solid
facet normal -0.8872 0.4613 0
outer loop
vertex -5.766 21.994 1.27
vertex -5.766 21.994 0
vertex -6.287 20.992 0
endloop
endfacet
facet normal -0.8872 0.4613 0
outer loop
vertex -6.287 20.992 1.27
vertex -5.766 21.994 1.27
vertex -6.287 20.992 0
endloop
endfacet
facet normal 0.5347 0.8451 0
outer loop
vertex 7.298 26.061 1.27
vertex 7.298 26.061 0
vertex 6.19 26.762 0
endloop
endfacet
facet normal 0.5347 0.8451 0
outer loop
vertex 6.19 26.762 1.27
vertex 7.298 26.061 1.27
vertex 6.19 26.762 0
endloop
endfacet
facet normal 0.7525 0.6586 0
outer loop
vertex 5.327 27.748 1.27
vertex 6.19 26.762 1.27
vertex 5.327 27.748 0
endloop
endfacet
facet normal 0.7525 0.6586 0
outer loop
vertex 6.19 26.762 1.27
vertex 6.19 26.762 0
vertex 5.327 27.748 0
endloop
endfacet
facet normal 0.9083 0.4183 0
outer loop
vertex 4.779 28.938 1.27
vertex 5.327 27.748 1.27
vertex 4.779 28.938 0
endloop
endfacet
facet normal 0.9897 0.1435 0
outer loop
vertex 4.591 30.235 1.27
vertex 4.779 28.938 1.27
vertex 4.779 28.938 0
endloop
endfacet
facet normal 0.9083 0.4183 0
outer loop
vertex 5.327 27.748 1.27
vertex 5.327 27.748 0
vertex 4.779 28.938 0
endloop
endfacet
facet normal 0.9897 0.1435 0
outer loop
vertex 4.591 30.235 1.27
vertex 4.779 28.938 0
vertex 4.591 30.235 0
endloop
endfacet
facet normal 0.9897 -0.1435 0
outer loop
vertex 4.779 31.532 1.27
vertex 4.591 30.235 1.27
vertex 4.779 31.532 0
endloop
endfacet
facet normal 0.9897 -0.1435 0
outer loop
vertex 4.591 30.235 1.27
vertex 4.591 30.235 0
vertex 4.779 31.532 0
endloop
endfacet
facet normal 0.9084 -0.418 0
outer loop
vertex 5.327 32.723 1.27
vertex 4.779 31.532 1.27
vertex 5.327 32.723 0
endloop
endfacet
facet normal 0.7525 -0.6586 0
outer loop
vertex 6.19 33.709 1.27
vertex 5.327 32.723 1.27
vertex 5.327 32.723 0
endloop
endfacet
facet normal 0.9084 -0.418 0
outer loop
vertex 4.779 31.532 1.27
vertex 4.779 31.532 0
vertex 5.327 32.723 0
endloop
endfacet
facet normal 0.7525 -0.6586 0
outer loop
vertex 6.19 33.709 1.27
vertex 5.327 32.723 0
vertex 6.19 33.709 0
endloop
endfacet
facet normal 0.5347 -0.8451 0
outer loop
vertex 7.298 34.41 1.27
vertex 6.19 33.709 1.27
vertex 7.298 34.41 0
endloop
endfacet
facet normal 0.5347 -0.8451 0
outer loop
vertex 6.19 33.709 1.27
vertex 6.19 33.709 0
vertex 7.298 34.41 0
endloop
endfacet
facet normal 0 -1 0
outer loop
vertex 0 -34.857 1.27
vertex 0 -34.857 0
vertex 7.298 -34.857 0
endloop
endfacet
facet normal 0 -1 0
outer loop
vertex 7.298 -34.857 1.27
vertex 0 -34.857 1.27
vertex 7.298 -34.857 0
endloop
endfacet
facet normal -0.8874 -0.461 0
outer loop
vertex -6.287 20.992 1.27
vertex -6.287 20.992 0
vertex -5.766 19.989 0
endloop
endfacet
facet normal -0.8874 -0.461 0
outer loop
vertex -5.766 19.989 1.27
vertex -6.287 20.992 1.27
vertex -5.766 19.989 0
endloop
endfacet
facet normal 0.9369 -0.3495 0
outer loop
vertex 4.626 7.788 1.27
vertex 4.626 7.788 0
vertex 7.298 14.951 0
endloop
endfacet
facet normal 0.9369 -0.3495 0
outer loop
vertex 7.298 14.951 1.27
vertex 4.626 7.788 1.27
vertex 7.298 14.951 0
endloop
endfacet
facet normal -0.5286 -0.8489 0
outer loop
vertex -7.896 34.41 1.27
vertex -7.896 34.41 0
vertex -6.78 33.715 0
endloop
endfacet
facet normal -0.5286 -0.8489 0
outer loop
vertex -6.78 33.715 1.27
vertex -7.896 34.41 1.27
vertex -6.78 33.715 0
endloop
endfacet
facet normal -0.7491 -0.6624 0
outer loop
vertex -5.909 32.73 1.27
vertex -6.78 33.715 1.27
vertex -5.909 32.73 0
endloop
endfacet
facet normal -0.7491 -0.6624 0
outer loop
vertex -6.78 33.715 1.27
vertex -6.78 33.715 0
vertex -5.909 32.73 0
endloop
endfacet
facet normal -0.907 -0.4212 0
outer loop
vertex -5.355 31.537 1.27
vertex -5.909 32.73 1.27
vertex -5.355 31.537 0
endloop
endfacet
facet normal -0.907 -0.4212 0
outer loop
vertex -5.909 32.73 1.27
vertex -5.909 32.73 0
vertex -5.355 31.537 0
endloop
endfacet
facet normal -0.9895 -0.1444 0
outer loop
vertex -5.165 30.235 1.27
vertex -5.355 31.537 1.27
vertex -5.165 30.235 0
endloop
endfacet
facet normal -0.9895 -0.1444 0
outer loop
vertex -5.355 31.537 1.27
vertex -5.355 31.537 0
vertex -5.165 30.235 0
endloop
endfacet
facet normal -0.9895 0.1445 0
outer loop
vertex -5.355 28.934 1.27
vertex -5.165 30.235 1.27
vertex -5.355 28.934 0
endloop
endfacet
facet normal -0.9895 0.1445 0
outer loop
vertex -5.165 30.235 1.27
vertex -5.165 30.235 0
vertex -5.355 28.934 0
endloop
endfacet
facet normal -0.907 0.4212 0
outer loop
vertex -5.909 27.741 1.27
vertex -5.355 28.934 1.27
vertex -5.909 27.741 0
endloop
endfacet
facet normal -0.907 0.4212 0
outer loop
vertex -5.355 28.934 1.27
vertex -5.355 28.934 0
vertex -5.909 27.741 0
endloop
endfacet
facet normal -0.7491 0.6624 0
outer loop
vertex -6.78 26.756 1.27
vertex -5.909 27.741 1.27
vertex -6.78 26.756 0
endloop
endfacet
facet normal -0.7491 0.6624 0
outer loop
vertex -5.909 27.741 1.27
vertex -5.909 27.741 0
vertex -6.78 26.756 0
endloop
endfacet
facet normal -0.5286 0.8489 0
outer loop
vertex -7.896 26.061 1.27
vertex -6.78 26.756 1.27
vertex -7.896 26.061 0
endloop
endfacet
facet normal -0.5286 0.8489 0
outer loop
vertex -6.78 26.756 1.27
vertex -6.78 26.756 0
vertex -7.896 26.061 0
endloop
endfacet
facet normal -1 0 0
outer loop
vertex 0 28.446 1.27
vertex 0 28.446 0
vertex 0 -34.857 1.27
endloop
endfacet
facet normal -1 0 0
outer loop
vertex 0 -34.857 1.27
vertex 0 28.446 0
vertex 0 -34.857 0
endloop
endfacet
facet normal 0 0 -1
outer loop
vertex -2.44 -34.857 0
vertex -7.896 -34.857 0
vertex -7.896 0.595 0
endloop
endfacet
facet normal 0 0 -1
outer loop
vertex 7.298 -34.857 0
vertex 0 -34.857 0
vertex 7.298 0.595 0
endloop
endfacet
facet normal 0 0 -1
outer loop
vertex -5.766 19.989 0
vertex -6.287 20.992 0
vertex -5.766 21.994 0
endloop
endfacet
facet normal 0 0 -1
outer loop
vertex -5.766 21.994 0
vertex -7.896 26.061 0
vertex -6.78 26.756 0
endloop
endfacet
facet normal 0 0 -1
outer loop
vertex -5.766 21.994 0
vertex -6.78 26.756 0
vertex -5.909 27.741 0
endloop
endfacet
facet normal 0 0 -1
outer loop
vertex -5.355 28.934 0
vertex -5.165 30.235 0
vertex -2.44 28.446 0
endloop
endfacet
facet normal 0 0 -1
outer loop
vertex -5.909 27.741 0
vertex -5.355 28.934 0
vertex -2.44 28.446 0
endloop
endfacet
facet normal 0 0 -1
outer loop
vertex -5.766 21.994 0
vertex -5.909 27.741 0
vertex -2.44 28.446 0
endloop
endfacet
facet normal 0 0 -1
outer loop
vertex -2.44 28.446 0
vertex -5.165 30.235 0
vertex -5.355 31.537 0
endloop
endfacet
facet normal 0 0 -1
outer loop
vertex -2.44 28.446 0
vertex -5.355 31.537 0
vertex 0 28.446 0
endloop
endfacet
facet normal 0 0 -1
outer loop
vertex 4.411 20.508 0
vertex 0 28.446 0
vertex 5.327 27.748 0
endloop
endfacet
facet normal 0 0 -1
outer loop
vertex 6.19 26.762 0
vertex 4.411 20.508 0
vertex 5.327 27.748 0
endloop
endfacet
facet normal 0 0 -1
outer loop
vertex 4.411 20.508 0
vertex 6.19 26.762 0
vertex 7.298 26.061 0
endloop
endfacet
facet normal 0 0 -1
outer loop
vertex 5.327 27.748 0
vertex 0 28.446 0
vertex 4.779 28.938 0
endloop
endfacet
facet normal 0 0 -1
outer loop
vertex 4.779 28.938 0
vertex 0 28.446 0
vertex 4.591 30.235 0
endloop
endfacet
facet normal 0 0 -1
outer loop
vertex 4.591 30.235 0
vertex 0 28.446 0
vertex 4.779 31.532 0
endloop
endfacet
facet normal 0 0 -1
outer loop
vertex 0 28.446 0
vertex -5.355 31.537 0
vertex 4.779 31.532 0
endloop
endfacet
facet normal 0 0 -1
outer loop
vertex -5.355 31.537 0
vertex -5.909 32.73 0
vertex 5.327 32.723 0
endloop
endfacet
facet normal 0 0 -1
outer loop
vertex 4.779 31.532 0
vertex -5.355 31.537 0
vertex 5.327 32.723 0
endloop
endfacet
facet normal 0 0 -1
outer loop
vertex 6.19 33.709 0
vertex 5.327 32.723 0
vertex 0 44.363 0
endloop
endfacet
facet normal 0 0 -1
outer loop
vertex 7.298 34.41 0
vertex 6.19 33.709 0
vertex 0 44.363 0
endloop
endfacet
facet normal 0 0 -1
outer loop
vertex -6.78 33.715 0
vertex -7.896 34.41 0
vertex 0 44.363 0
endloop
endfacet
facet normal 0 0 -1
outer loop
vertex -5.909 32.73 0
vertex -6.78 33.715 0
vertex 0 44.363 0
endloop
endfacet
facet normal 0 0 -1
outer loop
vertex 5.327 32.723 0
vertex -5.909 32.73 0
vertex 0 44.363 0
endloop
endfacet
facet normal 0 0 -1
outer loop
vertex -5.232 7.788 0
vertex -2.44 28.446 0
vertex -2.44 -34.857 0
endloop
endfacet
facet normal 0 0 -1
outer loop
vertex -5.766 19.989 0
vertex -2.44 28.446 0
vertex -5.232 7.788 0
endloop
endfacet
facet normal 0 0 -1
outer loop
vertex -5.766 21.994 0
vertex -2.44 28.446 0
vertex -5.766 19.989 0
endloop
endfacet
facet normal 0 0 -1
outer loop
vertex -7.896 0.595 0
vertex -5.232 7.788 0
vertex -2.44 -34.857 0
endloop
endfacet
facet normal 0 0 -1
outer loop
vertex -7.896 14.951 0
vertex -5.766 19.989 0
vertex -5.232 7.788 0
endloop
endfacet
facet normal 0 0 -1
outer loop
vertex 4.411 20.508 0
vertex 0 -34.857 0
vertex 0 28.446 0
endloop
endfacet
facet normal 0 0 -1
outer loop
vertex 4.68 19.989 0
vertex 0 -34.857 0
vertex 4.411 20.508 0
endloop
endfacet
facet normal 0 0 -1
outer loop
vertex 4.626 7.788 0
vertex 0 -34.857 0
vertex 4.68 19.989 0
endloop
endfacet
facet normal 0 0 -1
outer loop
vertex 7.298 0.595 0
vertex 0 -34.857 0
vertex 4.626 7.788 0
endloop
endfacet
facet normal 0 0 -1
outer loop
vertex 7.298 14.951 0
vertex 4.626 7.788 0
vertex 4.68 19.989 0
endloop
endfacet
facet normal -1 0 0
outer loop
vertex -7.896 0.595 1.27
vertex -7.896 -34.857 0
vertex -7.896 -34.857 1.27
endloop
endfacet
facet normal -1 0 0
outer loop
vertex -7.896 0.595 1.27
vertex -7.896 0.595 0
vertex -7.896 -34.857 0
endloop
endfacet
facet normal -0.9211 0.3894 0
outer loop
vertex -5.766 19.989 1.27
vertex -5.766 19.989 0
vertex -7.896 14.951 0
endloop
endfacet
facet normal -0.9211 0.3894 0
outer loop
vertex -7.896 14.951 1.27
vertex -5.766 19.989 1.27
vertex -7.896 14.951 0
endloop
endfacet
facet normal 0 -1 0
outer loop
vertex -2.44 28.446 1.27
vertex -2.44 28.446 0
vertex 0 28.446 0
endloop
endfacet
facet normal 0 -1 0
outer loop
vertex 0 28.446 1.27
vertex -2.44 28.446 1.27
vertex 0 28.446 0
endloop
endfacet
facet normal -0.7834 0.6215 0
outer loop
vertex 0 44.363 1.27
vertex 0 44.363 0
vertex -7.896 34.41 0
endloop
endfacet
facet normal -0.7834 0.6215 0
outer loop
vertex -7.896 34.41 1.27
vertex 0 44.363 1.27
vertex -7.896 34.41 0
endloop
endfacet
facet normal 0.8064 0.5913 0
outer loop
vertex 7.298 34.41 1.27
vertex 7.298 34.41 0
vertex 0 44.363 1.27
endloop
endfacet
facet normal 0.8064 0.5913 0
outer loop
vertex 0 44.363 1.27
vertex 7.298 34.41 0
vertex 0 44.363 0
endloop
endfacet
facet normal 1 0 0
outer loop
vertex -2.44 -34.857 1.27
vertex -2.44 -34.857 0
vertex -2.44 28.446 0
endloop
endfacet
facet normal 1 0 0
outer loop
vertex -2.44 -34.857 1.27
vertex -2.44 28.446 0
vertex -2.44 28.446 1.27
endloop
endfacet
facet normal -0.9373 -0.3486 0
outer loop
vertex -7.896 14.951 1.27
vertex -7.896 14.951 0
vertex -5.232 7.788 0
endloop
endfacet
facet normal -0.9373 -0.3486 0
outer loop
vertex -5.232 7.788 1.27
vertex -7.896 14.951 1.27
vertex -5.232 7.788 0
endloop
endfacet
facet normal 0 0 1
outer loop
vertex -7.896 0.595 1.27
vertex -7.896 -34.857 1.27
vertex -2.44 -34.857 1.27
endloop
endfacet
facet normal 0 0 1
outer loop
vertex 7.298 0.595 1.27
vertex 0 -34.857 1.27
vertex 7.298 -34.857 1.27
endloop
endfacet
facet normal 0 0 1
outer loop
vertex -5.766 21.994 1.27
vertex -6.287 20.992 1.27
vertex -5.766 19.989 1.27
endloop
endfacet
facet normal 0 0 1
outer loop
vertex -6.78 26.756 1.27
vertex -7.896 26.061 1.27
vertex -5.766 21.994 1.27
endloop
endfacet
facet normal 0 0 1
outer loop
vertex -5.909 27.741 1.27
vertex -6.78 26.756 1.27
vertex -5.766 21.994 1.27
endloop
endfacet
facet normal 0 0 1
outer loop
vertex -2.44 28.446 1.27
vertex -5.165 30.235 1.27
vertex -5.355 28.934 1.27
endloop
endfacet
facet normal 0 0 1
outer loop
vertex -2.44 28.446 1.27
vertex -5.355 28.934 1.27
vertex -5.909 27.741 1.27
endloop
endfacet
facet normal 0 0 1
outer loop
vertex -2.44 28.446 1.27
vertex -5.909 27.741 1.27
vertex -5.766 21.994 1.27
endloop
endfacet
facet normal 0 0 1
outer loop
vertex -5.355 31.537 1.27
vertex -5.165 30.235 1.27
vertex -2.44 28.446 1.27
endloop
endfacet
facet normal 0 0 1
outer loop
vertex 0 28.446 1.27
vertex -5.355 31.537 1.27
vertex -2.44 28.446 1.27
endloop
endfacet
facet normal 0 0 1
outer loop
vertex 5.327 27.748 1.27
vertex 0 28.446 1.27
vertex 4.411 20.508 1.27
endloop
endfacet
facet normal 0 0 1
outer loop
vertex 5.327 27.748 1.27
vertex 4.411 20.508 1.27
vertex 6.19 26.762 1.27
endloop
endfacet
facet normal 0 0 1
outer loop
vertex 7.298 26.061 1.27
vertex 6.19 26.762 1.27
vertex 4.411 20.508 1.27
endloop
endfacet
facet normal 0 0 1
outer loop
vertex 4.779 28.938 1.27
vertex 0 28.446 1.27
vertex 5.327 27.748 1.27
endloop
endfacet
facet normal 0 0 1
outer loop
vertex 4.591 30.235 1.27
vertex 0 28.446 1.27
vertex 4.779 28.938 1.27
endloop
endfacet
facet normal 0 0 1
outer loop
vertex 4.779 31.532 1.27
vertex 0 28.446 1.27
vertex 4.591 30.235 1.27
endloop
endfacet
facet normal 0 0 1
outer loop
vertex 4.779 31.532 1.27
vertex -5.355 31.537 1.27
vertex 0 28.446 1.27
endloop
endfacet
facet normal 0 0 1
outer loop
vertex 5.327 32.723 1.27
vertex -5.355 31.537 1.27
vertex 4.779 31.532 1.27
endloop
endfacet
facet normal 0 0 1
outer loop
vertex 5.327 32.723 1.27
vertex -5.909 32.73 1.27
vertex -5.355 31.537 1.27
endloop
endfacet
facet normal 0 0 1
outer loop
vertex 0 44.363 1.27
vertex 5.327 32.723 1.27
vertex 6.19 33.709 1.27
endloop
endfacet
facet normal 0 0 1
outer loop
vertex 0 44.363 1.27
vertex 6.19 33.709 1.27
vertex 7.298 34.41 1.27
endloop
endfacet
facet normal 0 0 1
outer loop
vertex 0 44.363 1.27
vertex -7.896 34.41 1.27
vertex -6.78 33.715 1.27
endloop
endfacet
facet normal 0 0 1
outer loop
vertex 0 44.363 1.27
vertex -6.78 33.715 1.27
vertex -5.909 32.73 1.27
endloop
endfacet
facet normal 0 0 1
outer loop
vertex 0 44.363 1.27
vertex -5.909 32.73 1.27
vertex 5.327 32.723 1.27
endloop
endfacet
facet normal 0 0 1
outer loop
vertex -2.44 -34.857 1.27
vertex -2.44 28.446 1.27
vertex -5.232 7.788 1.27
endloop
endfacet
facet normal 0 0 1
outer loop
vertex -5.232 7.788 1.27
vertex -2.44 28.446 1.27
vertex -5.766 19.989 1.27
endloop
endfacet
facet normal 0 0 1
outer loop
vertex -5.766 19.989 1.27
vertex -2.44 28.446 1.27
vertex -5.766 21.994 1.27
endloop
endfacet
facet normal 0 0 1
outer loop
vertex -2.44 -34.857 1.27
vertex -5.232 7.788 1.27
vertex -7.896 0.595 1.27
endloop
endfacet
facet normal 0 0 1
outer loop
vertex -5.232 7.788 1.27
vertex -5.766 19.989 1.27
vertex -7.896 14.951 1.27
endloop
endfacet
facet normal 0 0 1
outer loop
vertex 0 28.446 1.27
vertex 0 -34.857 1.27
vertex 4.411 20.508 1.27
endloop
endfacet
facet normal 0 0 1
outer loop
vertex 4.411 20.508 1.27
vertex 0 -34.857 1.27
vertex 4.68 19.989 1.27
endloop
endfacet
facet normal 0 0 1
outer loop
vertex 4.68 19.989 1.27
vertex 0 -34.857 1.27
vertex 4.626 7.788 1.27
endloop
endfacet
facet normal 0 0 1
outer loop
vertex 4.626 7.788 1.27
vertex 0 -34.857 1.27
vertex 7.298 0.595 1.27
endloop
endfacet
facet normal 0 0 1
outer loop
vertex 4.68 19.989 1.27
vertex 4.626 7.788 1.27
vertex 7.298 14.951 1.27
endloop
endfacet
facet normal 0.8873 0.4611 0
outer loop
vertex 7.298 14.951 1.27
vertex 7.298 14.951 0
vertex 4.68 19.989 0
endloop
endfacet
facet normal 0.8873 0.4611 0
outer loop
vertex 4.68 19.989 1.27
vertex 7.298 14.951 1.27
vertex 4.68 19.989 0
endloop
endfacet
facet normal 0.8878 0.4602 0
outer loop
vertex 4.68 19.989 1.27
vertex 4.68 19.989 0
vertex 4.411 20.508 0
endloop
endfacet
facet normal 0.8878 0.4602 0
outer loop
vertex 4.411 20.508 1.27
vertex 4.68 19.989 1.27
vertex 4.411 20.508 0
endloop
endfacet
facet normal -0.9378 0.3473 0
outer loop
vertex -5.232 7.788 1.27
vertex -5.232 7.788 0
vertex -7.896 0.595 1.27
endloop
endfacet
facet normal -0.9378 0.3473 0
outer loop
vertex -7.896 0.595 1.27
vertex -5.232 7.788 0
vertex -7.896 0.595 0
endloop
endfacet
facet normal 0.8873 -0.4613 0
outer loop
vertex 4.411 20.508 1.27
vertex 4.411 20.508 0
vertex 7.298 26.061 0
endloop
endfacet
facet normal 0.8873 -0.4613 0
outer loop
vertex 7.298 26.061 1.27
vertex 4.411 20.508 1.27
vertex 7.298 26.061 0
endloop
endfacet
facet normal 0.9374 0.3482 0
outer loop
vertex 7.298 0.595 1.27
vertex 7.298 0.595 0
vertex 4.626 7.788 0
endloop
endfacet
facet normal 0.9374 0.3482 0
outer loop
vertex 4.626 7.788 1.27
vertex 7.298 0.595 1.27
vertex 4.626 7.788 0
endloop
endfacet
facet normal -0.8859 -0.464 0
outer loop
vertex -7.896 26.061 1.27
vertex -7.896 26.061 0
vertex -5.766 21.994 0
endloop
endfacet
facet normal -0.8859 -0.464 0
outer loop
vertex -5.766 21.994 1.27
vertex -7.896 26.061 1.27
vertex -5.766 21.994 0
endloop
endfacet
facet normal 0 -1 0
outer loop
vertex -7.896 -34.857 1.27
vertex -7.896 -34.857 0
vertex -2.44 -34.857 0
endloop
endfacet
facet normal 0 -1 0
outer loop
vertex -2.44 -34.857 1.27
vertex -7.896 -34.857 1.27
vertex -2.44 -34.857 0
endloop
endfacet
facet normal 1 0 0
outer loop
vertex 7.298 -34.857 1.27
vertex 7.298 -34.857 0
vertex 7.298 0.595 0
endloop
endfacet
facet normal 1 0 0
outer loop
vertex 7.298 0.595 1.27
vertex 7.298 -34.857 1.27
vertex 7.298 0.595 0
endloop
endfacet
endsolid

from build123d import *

# Parameters (mm, degrees)
F1_DEPTH = 1.27
F2_DEPTH = 25.4


with BuildPart() as f1:
    # F0 (on Top) → F1 (new body)
    with BuildSketch(Plane.XY):
        with BuildLine():
            Line((-7.8964941204, 0.594703597), (-7.8964941204, -9.457487613))
            Line((-7.8964941204, -9.457487613), (-2.4395394139, -9.457487613))
            Line((-2.4395394139, -9.457487613), (-2.4395394139, 28.4462347627))
            Line((-2.4395394139, 28.4462347627), (0, 28.4462347627))
            Line((0, 28.4462347627), (0, -9.457487613))
            Line((0, -9.457487613), (7.2978408041, -9.457487613))
            Line((7.2978408041, -9.457487613), (7.2978408041, 0.594703597))
            Line((7.2978408041, 0.594703597), (4.625886213, 7.7879833989))
            Line((4.625886213, 7.7879833989), (7.2978408041, 14.9506824091))
            Line((7.2978408041, 14.9506824091), (4.6798829606, 19.9893178358))
            Line((4.6798829606, 19.9893178358), (4.410501927, 20.5077802788))
            Line((4.410501927, 20.5077802788), (5.1833918382, 21.9942174312))
            Line((5.1833918382, 21.9942174312), (7.2978408041, 26.0607674718))
            ThreePointArc((7.2978408041, 26.0607674718), (4.591156401, 30.2353352308), (7.2978408041, 34.4099029899))
            Line((7.2978408041, 34.4099029899), (-7.8964941204, 34.4099029899))
            ThreePointArc((-7.8964941204, 34.4099029899), (-5.1649912395, 30.2353352308), (-7.8964941204, 26.0607674718))
            Line((-7.8964941204, 26.0607674718), (-5.7663979357, 21.9942174312))
            Line((-5.7663979357, 21.9942174312), (-6.2874402602, 20.992138535))
            Line((-6.2874402602, 20.992138535), (-5.7663979357, 19.9893178358))
            Line((-5.7663979357, 19.9893178358), (-7.8964941204, 14.9506824091))
            Line((-7.8964941204, 14.9506824091), (-5.2315704525, 7.7879833989))
            Line((-5.2315704525, 7.7879833989), (-7.8964941204, 0.594703597))
        make_face()
        Polygon((0, 44.3628914654), (-7.8964941204, 34.4099029899), (7.2978408041, 34.4099029899), align=None)
    extrude(amount=F1_DEPTH)

    # F2 (add): faces of the model
    f2_faces = [f1.faces().sort_by_distance(p)[0] for p in [
        (-5.1680167671, -9.457487613, 0.635),
        (3.648920402, -9.457487613, 0.635),
    ]]
    extrude(f2_faces, amount=F2_DEPTH)


solid = f1.part
